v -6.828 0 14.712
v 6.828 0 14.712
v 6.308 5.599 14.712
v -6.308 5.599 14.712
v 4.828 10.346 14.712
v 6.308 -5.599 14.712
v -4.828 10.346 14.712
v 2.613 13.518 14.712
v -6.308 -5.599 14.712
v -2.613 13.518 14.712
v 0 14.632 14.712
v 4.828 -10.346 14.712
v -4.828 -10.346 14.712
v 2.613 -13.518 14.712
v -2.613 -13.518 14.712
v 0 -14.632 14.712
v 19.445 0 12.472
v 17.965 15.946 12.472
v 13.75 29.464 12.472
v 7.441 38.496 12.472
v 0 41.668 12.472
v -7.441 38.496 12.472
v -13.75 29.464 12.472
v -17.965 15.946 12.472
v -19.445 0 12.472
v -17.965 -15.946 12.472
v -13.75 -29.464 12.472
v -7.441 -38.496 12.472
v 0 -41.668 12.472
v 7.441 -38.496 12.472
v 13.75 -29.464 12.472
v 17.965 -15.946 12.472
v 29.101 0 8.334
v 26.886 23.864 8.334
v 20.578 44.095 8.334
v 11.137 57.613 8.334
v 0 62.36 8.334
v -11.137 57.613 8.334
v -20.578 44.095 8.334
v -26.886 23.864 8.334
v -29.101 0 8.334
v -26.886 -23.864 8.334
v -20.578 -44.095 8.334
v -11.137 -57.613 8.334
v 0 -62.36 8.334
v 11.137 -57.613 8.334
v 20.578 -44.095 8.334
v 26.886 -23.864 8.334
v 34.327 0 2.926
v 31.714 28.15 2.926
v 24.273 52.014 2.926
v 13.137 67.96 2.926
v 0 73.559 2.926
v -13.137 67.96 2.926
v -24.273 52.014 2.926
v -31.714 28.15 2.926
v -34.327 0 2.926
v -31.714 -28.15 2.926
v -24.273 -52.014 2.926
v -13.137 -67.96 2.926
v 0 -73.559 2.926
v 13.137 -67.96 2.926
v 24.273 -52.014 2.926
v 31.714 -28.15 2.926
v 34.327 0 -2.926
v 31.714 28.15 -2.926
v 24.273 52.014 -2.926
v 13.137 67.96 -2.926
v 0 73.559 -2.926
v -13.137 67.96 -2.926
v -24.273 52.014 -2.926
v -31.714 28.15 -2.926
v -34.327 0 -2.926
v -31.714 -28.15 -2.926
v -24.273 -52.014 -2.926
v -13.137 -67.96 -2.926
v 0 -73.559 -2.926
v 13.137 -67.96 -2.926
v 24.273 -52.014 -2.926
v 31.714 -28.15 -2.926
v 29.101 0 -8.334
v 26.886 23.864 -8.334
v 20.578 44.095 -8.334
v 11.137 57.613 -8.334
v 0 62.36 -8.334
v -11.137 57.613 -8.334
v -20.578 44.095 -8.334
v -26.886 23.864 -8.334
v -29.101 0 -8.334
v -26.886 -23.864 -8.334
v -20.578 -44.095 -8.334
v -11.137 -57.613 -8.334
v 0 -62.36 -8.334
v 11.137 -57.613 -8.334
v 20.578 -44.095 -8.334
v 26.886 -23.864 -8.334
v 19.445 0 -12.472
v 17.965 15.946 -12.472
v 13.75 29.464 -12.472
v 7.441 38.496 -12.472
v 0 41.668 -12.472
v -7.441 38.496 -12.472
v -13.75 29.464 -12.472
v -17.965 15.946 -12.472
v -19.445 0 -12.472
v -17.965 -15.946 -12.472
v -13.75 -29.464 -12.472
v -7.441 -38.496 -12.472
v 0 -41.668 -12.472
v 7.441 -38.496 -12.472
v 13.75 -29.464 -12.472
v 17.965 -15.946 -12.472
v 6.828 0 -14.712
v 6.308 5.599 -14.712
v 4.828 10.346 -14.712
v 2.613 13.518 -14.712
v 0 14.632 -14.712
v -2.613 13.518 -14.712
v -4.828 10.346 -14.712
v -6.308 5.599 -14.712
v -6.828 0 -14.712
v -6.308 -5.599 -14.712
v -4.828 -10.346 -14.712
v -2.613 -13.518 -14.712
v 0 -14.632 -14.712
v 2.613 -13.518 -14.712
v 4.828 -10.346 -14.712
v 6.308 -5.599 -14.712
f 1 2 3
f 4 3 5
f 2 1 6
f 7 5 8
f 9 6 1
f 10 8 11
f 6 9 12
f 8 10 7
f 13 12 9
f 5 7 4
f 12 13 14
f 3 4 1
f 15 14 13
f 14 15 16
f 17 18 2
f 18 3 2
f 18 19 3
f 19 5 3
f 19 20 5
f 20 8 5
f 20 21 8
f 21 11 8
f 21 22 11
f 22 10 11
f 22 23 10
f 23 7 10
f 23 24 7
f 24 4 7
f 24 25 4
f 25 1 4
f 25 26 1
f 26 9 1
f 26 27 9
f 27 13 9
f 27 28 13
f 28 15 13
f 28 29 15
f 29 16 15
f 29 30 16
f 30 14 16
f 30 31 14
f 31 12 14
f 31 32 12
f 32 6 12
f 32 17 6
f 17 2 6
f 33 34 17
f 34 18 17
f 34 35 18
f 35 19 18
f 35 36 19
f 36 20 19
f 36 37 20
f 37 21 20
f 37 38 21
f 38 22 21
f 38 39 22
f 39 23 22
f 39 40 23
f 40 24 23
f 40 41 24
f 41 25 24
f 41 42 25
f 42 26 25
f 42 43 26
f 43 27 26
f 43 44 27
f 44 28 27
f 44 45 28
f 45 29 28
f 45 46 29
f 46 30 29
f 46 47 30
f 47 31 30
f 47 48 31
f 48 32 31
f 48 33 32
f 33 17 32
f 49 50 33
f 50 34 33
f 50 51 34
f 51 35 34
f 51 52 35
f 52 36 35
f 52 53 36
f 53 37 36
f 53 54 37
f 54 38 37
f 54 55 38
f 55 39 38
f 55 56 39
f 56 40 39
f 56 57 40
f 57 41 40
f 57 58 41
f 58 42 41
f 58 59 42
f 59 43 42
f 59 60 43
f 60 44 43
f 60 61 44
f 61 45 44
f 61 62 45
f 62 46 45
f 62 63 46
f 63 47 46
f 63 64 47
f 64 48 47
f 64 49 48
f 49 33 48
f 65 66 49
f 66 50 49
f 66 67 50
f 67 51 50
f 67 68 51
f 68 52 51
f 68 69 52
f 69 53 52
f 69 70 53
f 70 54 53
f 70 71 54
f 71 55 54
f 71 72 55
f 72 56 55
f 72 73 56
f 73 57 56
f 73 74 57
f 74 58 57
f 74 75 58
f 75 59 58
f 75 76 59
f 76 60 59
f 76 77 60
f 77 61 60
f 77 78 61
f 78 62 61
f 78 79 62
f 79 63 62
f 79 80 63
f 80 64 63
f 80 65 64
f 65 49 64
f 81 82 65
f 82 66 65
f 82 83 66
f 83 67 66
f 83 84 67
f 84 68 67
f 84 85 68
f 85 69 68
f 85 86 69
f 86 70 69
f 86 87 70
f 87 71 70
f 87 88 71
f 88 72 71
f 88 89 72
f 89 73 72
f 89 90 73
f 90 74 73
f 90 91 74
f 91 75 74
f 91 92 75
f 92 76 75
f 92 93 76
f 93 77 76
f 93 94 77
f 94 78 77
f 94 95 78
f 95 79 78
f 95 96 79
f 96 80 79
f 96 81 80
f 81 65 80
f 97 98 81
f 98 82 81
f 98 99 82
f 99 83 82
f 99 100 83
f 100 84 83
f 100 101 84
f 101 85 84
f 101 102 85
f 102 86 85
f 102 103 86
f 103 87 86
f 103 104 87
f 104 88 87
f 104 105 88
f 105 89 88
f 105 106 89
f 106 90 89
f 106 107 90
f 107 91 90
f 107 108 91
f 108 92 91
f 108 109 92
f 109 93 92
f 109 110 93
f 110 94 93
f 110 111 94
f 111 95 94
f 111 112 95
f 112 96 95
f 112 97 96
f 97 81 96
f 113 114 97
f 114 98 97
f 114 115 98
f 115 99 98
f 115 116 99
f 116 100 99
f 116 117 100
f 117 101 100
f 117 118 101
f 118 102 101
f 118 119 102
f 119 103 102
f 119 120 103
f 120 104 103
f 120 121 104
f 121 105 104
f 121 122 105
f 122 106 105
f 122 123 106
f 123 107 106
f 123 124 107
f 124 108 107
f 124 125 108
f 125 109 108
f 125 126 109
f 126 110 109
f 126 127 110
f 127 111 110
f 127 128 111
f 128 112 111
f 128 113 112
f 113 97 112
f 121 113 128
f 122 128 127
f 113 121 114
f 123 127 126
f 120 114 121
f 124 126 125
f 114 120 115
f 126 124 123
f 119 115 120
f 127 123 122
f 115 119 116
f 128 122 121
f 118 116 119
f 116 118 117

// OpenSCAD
// Generated by SolidPython 1.0.1 on 2020-07-29 00:46:47


scale(v = [7, 15, 3]) {
	sphere(r = 5);
}
/***********************************************
*********      SolidPython code:      **********
************************************************
 
# import packages: SolidPython
from solid import *
from solid.utils import *
from itertools import chain, combinations, permutations


class Resize:

    def __init__(self, scad_file):
        self.scad_file = scad_file
        #self.scad_file = import_scad(scad_file)
        # cone/cylinder param:
        self.r1 = 0
        self.r2 = 0
        self.h = 0
        # rectangular prism param:
        self.w = 0
        self.l = 0
        # ellipse param:
        self.r = 0

    # import OpenScad code (file name corresponds to shape)


    # classify shape + parameters
    def assign(self, param1, param2, param3):
        if self.scad_file == 'cone.scad':
            self.r1 = param1
            self.r2 = param2
            self.h = param3
        elif self.scad_file == 'cylinder.scad':
            self.r1 = param1
            self.r2 = param2
            self.h = param3
        elif self.scad_file == 'rectangularPrism.scad':
            self.h = param1
            self.l = param2
            self.w = param3
        else:
            self.r = param1
            self.h = param2

    # resize parameters
    def iterate(self):
        x = range(3, 20, 2)
        i = 1
        if self.scad_file == 'cone.scad':
            tempList = list(permutations(x, 2))
            for temp in tempList:
                param1 = temp[0]
                param2 = temp[1]
                filepath = 'produced_scad_files/' + 'cone' + str(param1) + '_' + str(param2) + '_' + '.scad'
                scad_render_to_file(cylinder(h=param1, r1=param2, r2=0), filepath)

        elif self.scad_file == 'cylinder.scad':
            tempList = list(permutations(x, 3))
            for temp in tempList:
                param1 = temp[0]
                param2 = temp[1]
                filepath = 'produced_scad_files/' + 'cylinder' + str(param1) + '_' + str(param2) + '_' + '.scad'
                scad_render_to_file(cylinder(h=param1, r1=param2, r2=param2), filepath)

        elif self.scad_file == 'rectangularPrism.scad':
            tempList = list(permutations(x, 3))
            for temp in tempList:
                param1 = temp[0]
                param2 = temp[1]
                param3 = temp[2]
                filepath = 'produced_scad_files/' + 'rectangularPrism' + str(param1) + '_' + str(param2) + '_' + str(
                    param3) + '.scad'
                scad_render_to_file(cube(size=(param1, param2, param3)), filepath)

        elif self.scad_file == 'ellipse.scad':
            tempList = list(permutations(x, 4))
            for temp in tempList:
                param1 = temp[0]
                param2 = temp[1]
                param3 = temp[2]
                param4 = temp[3]
                filepath = 'produced_scad_files/' + 'ellipse' + str(param1) + '_' + str(param2) + '_' + str(param3) + '_' + str(param4) + '.scad'
                scad_render_to_file(scale([param1, param2, param3])(sphere(r=param4)), filepath)

    def render_to_scadfile(self):
        scad_render_to_file(scad, 'example.scad') 
 
************************************************/
